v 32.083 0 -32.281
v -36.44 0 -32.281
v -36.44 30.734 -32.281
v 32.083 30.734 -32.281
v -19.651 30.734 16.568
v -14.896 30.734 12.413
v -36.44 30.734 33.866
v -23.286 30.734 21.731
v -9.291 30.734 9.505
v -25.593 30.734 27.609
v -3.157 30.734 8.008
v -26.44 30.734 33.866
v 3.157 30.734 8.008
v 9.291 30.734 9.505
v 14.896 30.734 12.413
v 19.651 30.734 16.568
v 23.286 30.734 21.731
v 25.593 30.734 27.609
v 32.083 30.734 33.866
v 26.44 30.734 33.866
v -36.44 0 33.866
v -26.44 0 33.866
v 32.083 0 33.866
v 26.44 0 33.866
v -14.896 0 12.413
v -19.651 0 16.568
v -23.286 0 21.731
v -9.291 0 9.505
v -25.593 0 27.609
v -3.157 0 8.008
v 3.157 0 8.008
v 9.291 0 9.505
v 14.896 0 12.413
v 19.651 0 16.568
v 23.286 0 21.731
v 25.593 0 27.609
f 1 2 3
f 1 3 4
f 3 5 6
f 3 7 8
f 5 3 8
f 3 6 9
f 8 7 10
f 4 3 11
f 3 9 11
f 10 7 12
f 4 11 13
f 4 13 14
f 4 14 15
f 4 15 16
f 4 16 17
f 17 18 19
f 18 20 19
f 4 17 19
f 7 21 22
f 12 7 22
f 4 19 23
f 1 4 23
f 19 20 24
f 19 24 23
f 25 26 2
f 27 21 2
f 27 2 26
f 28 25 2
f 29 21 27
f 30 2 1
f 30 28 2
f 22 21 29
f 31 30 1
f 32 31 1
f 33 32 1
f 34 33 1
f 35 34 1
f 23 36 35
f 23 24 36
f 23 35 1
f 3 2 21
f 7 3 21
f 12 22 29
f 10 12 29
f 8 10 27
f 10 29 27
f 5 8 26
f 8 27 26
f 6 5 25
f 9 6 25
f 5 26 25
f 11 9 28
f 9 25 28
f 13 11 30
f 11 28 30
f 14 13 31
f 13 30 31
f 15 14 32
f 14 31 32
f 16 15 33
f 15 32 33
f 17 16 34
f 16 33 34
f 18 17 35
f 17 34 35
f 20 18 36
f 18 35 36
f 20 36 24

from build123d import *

# Parameters (mm, degrees)
F0_W     = 77.63347
F0_H     = 66.146884
F1_DEPTH = 30.734
F2_R     = 26.443213
F3_DEPTH = 31.496
F5_DEPTH = 78.486
F6_DEPTH = 70.358


with BuildPart() as f1:
    # F0 (on Front) → F1 (new body)
    with BuildSketch(Plane.XZ):
        with Locations((2.376534, 0.792177)):
            Rectangle(F0_W, F0_H)
    extrude(amount=-F1_DEPTH)

    # F2 (on Front) → F3 (cut)
    with BuildSketch(Plane.XZ):
        with Locations((0, 34.261707)):
            Circle(F2_R)
    extrude(amount=-F3_DEPTH, mode=Mode.SUBTRACT)

    # F4 (on Top) → F5 (cut)
    with BuildSketch(Plane.XY):
        Polygon((32.083217, 39.410867), (32.083217, 31.092994), (32.083217, 0), (41.589357, 0), (41.589357, 39.410867), align=None)
    extrude(amount=F5_DEPTH, mode=Mode.SUBTRACT)

    # F4 (on Top) → F6 (cut)
    with BuildSketch(Plane.XY):
        Polygon((32.083217, 39.410867), (32.083217, 31.092994), (32.083217, 0), (41.589357, 0), (41.589357, 39.410867), align=None)
    extrude(amount=-F6_DEPTH, mode=Mode.SUBTRACT)


solid = f1.part
